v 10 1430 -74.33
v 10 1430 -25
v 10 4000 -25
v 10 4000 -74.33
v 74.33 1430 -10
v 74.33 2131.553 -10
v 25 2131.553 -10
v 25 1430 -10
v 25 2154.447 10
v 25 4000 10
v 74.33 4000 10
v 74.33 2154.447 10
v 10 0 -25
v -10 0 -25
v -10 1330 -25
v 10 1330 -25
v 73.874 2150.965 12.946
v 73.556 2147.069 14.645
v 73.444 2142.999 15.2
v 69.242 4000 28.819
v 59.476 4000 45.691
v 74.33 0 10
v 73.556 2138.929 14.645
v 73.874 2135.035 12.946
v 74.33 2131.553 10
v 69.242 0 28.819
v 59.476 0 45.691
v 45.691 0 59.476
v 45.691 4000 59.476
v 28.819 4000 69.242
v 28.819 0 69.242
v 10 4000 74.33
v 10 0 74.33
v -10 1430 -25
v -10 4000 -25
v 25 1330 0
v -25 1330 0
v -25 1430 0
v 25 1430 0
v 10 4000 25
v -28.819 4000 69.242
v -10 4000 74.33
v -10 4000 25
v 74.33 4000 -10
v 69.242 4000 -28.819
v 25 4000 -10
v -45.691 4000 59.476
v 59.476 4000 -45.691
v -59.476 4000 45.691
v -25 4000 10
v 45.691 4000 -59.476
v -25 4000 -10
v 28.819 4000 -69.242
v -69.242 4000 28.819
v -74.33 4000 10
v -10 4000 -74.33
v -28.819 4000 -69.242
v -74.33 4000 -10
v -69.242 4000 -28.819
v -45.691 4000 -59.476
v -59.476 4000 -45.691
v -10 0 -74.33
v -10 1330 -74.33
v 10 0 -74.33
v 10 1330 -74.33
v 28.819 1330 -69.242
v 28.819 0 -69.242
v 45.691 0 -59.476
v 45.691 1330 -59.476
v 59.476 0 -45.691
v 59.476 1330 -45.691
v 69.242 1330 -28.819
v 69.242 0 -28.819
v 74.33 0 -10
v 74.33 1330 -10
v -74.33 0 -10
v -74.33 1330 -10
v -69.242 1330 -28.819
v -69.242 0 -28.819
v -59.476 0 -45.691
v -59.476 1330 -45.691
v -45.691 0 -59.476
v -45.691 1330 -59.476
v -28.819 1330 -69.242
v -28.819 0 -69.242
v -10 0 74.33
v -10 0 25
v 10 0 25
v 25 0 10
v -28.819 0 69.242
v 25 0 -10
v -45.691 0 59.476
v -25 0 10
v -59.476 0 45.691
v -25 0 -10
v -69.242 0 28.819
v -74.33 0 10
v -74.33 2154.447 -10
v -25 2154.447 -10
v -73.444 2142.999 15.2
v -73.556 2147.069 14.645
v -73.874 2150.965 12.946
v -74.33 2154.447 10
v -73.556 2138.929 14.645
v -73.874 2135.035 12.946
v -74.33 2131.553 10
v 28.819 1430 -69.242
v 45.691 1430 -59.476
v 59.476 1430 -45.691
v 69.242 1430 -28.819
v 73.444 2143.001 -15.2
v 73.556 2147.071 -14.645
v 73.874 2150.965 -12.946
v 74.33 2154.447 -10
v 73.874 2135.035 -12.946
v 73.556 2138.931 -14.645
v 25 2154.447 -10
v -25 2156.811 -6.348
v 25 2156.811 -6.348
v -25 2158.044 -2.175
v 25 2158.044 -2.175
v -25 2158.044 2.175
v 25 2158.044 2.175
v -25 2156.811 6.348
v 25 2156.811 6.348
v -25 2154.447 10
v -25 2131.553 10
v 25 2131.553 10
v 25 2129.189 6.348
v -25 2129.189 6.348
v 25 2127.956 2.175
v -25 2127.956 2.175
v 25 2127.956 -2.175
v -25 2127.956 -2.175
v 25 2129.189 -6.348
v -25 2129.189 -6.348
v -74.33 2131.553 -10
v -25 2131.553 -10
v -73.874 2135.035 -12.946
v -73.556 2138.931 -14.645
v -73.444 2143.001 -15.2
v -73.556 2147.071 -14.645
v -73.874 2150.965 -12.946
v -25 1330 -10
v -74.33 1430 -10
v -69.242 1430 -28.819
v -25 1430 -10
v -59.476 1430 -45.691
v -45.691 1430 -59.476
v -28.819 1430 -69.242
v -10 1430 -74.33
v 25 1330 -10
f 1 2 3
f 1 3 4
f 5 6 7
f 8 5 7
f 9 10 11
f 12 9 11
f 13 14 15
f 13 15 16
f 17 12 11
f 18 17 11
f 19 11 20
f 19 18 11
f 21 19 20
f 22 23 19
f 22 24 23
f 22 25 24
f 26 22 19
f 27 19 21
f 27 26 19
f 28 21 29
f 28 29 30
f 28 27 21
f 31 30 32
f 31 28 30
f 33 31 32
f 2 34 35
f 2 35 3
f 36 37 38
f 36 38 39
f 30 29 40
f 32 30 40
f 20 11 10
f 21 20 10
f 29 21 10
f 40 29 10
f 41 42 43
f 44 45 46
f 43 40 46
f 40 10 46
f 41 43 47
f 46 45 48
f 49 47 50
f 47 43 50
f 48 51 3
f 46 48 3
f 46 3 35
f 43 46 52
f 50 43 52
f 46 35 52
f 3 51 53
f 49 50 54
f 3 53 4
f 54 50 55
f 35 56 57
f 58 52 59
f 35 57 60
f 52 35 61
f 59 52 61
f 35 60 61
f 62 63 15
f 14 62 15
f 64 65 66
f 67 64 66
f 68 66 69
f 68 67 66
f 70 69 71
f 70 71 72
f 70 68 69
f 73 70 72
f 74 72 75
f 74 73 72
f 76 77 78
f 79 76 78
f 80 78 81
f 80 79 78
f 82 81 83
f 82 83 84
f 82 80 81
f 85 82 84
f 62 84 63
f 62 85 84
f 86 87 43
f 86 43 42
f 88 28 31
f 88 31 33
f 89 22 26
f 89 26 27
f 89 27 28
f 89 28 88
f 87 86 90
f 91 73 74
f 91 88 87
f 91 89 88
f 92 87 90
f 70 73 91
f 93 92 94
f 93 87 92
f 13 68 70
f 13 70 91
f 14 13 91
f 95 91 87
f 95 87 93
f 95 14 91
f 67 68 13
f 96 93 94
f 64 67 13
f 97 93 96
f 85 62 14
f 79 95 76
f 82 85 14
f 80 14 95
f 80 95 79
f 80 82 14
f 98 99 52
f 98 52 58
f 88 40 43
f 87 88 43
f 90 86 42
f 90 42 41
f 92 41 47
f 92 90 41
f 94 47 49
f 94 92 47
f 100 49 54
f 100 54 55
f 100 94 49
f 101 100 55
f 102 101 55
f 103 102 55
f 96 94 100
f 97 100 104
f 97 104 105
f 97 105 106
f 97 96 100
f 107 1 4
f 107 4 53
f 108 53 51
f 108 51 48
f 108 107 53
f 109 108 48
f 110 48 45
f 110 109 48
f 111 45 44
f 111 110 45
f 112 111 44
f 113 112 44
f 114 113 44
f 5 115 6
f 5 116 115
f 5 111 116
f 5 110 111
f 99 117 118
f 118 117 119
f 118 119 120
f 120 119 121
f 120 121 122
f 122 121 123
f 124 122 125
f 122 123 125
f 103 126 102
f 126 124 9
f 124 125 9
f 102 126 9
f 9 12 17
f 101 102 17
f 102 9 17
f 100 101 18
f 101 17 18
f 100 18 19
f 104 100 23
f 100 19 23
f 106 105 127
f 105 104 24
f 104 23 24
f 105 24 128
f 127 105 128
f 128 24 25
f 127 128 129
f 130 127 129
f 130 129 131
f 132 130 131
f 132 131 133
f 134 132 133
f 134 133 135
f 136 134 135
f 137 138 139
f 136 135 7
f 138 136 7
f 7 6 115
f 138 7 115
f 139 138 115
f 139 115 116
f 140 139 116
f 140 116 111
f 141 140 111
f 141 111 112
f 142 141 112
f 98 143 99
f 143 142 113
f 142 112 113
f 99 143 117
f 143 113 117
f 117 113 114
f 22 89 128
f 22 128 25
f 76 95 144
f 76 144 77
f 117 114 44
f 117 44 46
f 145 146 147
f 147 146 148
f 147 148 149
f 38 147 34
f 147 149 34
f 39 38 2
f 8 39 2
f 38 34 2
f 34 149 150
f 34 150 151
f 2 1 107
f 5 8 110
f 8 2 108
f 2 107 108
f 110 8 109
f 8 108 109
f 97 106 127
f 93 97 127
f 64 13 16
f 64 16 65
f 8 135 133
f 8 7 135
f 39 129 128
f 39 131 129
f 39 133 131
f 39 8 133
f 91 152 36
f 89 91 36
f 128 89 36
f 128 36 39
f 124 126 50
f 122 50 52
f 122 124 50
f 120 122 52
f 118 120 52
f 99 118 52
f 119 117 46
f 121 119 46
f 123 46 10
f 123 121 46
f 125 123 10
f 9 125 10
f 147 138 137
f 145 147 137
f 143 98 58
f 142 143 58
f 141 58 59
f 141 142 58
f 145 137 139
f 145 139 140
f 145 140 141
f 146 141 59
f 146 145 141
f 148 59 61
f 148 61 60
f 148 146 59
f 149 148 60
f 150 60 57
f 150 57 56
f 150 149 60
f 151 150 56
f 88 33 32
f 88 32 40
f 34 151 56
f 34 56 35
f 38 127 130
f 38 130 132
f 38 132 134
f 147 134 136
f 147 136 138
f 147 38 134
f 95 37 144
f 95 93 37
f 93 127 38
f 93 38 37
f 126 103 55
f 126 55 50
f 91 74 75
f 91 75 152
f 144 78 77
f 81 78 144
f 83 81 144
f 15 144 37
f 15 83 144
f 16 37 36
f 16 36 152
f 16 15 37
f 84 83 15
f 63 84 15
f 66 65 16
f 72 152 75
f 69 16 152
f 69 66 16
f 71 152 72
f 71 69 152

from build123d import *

# Parameters (mm, degrees)
BOSS_EXTRUDE2_DEPTH = 4000
CUT_EXTRUDE2_START  = 1380
SKETCH2_W           = 150.702712824
SKETCH2_H           = 74.330343737
CUT_EXTRUDE2_DEPTH  = 50
SKETCH3_R           = 15.2
CUT_EXTRUDE3_DEPTH  = 4004.451635776


with BuildPart() as part:
    # Sketch1 → Boss-Extrude2 (new body)
    with BuildSketch(Plane(origin=(0, 0, 0), x_dir=(1, 0, 0), z_dir=(0, 1, 0))):
        with BuildLine():
            Line((-10, 74.330343737), (-10, 25))
            Line((-10, 25), (10, 25))
            Line((10, 25), (10, 74.330343737))
            ThreePointArc((10, 74.330343737), (53.033008589, 53.033008589), (74.330343737, 10))
            Line((74.330343737, 10), (25, 10))
            Line((25, 10), (25, -10))
            Line((25, -10), (74.330343737, -10))
            ThreePointArc((74.330343737, -10), (53.033008589, -53.033008589), (10, -74.330343737))
            Line((10, -74.330343737), (10, -25))
            Line((10, -25), (-10, -25))
            Line((-10, -25), (-10, -74.330343737))
            ThreePointArc((-10, -74.330343737), (-53.033008589, -53.033008589), (-74.330343737, -10))
            Line((-74.330343737, -10), (-25, -10))
            Line((-25, -10), (-25, 10))
            Line((-25, 10), (-74.330343737, 10))
            ThreePointArc((-74.330343737, 10), (-53.033008589, 53.033008589), (-10, 74.330343737))
        make_face()
    extrude(amount=BOSS_EXTRUDE2_DEPTH)

    # Sketch2 → Cut-Extrude2 (cut, symmetric)
    with BuildSketch(Plane(origin=(0, 0, 0), x_dir=(1, 0, 0), z_dir=(0, 1, 0)).offset(CUT_EXTRUDE2_START)):
        with Locations((-1.021012675, 37.165171869)):
            Rectangle(SKETCH2_W, SKETCH2_H)
    extrude(amount=CUT_EXTRUDE2_DEPTH, both=True, mode=Mode.SUBTRACT)

    # Sketch3 → Cut-Extrude3 (cut, through all)
    with BuildSketch(Plane(origin=(74.330343737, 0, 0), x_dir=(0, 0, -1), z_dir=(1, 0, 0))):
        with Locations(Location((0, 2143, 0), (0, 0, 48.860489585))):
            Circle(SKETCH3_R)
    extrude(amount=-CUT_EXTRUDE3_DEPTH, mode=Mode.SUBTRACT)


solid = part.part
